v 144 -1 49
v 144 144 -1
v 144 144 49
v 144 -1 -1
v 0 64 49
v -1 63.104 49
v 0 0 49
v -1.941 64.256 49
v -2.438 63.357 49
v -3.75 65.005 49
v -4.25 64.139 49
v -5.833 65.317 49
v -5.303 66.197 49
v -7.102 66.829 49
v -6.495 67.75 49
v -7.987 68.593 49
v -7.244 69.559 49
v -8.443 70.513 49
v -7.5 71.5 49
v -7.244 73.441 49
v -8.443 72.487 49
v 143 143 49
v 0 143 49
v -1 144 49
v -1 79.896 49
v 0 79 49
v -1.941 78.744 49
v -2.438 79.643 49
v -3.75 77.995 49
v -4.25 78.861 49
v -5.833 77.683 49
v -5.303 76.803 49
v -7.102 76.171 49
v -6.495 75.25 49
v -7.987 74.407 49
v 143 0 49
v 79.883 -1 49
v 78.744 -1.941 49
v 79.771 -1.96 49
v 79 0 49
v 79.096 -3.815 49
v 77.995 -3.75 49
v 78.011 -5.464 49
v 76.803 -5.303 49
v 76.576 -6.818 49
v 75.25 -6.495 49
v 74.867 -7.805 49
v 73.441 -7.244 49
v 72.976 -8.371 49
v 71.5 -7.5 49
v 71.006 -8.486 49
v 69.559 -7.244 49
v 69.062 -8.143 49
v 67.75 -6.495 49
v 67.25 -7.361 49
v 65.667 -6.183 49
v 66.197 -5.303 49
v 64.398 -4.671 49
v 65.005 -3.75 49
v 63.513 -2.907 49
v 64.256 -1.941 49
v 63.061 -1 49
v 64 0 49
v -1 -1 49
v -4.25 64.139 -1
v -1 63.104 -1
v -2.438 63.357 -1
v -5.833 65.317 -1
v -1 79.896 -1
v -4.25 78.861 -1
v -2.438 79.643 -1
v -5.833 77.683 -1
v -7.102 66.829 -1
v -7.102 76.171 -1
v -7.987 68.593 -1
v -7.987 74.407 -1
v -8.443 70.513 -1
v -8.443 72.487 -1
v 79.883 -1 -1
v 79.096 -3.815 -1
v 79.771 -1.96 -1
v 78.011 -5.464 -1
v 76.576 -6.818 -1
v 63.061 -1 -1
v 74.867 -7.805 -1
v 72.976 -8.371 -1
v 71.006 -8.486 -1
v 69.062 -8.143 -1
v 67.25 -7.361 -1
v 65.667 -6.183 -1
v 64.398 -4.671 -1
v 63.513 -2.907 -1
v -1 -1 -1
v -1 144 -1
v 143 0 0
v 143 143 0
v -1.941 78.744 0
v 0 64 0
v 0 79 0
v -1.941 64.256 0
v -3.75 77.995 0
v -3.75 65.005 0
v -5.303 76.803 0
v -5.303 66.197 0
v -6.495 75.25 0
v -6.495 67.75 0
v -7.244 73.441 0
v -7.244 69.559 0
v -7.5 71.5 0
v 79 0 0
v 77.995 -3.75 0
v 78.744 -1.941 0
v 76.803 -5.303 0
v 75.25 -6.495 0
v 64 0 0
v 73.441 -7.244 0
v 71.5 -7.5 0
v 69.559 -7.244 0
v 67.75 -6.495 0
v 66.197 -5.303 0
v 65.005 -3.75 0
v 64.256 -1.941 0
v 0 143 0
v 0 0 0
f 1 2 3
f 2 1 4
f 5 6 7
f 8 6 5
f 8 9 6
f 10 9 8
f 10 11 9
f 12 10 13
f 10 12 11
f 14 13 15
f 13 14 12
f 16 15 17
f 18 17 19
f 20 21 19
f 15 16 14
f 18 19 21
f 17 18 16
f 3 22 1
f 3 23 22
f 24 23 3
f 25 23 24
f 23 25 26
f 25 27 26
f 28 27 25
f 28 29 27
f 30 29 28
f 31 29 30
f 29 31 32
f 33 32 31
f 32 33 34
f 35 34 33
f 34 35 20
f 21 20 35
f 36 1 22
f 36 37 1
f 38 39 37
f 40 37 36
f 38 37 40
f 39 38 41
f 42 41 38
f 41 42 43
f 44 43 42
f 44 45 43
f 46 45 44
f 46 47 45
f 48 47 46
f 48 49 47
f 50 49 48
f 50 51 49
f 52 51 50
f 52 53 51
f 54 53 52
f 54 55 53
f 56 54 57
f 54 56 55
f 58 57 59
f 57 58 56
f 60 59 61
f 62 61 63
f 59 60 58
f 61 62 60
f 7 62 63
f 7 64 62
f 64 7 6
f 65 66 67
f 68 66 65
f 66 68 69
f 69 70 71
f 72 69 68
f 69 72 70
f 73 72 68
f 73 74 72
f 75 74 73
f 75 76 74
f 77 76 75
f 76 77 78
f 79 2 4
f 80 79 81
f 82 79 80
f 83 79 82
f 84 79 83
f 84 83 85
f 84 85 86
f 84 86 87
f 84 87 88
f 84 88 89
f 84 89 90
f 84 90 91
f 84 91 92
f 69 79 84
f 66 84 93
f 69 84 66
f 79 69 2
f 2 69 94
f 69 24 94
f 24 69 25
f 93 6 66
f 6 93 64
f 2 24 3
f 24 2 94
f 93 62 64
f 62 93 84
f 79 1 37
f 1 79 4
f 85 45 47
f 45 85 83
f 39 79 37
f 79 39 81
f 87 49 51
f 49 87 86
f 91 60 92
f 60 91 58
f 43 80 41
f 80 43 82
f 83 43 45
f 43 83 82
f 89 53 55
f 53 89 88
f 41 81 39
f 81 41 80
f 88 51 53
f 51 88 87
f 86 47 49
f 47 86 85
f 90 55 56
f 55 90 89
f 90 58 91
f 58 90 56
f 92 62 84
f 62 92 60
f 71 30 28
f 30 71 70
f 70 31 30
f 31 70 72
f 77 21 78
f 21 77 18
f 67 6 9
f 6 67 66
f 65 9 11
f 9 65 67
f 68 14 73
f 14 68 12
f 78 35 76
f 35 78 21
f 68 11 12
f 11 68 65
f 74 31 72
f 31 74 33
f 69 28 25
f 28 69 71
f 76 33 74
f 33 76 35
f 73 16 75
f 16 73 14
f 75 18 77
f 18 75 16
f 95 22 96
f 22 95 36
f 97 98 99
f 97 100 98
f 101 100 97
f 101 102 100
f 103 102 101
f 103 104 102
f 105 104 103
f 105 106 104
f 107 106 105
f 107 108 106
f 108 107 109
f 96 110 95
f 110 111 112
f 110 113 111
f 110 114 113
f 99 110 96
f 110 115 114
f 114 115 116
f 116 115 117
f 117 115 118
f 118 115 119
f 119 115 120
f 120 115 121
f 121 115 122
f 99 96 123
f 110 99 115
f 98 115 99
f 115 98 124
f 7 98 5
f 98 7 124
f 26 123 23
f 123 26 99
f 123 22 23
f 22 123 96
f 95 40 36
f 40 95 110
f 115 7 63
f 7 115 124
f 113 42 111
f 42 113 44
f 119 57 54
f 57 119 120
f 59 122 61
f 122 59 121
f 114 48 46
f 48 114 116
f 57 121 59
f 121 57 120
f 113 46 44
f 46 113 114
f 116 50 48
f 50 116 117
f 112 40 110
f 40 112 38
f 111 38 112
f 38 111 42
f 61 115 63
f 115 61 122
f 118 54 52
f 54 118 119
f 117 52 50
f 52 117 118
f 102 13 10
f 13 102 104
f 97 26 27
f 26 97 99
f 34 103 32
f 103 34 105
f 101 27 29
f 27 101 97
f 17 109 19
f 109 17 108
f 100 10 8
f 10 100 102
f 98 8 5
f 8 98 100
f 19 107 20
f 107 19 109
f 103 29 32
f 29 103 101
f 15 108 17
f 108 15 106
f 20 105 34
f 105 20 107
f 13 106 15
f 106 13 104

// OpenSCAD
/*
 * Simple box for the Karak/Caracassonne tiles grid.
 *
 * Author: Vojtech Horky
 * License: CC BY-SA 4.0
 *
 * The actual tiles grid was created by user timqui and is available at:
 * https://www.printables.com/model/74459-carcassonne-karak-isle-of-skye-tiles-grid/
 *
 */
size = 143;
lock_size = 15;
height = 50;
wall_width = 1;

module the_box(size, height, lock_size, lock_offset=0) {
    cube([size, size, height]);
    translate([size / 2, lock_offset, 0]) {
        cylinder(h=height, d=lock_size);
    }
    translate([lock_offset, size / 2, 0]) {
        cylinder(h=height, d=lock_size);
    }
}

difference() {
    translate([-wall_width, -wall_width, -wall_width]) {
        the_box(size + 2*wall_width, height, lock_size + 2*wall_width, wall_width);
    }
    the_box(size, height, lock_size);
}
